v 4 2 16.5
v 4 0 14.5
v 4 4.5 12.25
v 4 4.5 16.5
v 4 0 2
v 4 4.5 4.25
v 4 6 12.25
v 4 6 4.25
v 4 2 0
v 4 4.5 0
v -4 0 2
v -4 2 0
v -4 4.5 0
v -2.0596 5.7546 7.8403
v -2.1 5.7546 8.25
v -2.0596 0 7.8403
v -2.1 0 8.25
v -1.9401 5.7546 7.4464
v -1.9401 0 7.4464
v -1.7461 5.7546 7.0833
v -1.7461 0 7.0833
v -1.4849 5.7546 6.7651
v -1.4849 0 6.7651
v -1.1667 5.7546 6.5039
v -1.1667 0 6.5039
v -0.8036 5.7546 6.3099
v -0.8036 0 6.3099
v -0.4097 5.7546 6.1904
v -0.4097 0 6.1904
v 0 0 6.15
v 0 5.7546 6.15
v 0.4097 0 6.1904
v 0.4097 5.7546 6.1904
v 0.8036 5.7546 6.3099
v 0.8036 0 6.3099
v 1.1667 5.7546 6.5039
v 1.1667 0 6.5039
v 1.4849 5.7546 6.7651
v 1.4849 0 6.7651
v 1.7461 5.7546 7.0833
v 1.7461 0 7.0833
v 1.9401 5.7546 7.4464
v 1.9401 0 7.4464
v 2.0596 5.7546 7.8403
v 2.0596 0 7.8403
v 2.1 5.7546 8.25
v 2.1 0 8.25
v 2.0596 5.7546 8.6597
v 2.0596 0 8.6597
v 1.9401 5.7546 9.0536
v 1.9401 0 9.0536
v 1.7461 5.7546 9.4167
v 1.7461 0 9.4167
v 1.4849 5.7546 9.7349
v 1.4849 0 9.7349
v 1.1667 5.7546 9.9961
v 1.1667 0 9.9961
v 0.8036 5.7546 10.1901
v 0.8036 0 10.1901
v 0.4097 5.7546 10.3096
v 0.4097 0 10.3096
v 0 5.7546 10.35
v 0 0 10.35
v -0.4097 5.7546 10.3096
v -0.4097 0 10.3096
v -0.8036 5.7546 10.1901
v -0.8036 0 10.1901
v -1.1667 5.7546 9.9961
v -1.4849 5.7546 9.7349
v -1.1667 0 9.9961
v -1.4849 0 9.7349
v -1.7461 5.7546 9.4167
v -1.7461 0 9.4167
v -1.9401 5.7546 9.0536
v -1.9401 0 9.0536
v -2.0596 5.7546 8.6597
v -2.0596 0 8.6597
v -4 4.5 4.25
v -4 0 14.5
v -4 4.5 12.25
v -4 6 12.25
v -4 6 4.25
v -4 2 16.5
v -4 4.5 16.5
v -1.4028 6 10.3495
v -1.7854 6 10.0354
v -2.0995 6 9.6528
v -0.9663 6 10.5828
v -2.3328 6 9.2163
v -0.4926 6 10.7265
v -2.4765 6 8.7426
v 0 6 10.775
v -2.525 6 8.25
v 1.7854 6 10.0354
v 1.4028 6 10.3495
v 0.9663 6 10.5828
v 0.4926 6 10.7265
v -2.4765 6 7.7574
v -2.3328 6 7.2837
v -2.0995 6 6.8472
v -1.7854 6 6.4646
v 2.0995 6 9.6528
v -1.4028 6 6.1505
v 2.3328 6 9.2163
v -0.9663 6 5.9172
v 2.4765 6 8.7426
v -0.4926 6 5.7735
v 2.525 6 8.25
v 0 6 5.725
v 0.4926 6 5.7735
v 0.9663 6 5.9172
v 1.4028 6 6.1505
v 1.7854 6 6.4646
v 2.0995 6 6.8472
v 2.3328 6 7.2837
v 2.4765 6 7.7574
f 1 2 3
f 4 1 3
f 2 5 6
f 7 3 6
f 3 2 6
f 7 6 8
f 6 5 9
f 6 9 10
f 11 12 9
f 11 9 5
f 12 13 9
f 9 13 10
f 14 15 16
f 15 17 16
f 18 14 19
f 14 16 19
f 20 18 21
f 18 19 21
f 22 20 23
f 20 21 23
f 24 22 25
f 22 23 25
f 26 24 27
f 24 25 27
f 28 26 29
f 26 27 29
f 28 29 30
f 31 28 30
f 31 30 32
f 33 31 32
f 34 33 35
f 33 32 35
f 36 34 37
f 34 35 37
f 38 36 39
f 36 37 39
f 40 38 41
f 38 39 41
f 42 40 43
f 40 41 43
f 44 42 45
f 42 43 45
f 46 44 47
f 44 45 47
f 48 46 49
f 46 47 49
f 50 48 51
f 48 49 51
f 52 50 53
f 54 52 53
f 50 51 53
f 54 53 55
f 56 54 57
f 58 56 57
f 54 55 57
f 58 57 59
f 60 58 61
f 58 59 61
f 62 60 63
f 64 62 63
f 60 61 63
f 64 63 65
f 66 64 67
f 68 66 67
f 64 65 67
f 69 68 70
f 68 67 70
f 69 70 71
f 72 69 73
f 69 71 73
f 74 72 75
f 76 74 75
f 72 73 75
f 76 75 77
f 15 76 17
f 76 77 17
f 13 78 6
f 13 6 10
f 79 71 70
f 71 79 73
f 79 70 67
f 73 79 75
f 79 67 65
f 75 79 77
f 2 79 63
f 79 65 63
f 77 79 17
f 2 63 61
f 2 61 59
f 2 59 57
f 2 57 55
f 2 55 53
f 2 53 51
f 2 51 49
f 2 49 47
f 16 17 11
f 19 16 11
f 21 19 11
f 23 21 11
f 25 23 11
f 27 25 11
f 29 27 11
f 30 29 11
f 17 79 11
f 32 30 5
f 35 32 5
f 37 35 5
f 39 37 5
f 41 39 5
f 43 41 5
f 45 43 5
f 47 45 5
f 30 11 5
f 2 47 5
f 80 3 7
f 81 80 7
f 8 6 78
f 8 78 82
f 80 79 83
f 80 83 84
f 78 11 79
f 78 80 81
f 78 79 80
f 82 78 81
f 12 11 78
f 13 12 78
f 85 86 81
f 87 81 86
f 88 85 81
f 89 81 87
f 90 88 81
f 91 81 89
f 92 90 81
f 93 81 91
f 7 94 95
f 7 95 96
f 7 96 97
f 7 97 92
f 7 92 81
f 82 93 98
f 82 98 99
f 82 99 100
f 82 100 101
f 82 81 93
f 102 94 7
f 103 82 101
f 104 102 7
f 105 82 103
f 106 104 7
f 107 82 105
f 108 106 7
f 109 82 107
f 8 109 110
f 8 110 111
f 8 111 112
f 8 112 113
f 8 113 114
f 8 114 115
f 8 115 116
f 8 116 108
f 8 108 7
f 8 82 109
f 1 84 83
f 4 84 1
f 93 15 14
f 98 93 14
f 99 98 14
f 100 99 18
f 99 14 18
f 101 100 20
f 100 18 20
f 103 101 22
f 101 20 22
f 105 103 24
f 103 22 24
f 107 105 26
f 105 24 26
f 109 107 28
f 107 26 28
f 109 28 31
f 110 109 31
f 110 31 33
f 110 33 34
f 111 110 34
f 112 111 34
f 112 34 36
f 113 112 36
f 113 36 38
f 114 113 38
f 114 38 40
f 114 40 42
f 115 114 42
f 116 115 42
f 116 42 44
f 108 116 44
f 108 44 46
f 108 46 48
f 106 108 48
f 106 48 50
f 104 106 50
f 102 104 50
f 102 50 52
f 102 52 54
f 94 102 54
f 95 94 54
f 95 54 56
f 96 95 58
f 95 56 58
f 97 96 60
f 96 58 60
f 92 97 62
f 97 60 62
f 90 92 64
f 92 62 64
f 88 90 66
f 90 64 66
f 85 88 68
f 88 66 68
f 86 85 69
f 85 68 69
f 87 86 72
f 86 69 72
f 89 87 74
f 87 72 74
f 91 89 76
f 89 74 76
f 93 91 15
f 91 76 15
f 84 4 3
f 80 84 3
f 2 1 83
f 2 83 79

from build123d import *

# Parameters (mm, degrees)
SCHIZZO1_W                      = 8
SCHIZZO1_H                      = 6
ESTRUSIONE_ESTRUSIONE1_DEPTH    = 16.5
FORO_FILETTATO_M5_1_D           = 4.2
FORO_FILETTATO_M5_1_CSINK_D     = 5.05
FORO_FILETTATO_M5_1_CSINK_ANGLE = 120
SCHIZZO4_W                      = 4.25
SCHIZZO4_H                      = 1.5
TAGLIO_ESTRUSIONE1_DEPTH        = 10


with BuildPart() as part:
    # Schizzo1 → Estrusione-Estrusione1 (new body)
    with BuildSketch(Plane.XY):
        with Locations((0, 3)):
            Rectangle(SCHIZZO1_W, SCHIZZO1_H)
    extrude(amount=ESTRUSIONE_ESTRUSIONE1_DEPTH)

    # Foro filettato M5-1 (through all)
    with Locations(Plane(origin=(0, 6, 0), x_dir=(1, 0, 0), z_dir=(0, 1, 0))):
        with Locations((0, -8.25)):
            CounterSinkHole(FORO_FILETTATO_M5_1_D / 2, FORO_FILETTATO_M5_1_CSINK_D / 2, counter_sink_angle=FORO_FILETTATO_M5_1_CSINK_ANGLE)

    # Schizzo4 → Taglio-Estrusione1 (cut)
    with BuildSketch(Plane(origin=(4, 0, 0), x_dir=(0, 0, -1), z_dir=(1, 0, 0))):
        Polygon((-16.5, 0), (-16.5, 2), (-14.5, 0), align=None)
        Polygon((0, 0), (0, 2), (-2, 0), align=None)
        with Locations((-2.125, 5.25)):
            Rectangle(SCHIZZO4_W, SCHIZZO4_H)
        with Locations((-14.375, 5.25)):
            Rectangle(SCHIZZO4_W, SCHIZZO4_H)
    extrude(amount=-TAGLIO_ESTRUSIONE1_DEPTH, mode=Mode.SUBTRACT)


solid = part.part
